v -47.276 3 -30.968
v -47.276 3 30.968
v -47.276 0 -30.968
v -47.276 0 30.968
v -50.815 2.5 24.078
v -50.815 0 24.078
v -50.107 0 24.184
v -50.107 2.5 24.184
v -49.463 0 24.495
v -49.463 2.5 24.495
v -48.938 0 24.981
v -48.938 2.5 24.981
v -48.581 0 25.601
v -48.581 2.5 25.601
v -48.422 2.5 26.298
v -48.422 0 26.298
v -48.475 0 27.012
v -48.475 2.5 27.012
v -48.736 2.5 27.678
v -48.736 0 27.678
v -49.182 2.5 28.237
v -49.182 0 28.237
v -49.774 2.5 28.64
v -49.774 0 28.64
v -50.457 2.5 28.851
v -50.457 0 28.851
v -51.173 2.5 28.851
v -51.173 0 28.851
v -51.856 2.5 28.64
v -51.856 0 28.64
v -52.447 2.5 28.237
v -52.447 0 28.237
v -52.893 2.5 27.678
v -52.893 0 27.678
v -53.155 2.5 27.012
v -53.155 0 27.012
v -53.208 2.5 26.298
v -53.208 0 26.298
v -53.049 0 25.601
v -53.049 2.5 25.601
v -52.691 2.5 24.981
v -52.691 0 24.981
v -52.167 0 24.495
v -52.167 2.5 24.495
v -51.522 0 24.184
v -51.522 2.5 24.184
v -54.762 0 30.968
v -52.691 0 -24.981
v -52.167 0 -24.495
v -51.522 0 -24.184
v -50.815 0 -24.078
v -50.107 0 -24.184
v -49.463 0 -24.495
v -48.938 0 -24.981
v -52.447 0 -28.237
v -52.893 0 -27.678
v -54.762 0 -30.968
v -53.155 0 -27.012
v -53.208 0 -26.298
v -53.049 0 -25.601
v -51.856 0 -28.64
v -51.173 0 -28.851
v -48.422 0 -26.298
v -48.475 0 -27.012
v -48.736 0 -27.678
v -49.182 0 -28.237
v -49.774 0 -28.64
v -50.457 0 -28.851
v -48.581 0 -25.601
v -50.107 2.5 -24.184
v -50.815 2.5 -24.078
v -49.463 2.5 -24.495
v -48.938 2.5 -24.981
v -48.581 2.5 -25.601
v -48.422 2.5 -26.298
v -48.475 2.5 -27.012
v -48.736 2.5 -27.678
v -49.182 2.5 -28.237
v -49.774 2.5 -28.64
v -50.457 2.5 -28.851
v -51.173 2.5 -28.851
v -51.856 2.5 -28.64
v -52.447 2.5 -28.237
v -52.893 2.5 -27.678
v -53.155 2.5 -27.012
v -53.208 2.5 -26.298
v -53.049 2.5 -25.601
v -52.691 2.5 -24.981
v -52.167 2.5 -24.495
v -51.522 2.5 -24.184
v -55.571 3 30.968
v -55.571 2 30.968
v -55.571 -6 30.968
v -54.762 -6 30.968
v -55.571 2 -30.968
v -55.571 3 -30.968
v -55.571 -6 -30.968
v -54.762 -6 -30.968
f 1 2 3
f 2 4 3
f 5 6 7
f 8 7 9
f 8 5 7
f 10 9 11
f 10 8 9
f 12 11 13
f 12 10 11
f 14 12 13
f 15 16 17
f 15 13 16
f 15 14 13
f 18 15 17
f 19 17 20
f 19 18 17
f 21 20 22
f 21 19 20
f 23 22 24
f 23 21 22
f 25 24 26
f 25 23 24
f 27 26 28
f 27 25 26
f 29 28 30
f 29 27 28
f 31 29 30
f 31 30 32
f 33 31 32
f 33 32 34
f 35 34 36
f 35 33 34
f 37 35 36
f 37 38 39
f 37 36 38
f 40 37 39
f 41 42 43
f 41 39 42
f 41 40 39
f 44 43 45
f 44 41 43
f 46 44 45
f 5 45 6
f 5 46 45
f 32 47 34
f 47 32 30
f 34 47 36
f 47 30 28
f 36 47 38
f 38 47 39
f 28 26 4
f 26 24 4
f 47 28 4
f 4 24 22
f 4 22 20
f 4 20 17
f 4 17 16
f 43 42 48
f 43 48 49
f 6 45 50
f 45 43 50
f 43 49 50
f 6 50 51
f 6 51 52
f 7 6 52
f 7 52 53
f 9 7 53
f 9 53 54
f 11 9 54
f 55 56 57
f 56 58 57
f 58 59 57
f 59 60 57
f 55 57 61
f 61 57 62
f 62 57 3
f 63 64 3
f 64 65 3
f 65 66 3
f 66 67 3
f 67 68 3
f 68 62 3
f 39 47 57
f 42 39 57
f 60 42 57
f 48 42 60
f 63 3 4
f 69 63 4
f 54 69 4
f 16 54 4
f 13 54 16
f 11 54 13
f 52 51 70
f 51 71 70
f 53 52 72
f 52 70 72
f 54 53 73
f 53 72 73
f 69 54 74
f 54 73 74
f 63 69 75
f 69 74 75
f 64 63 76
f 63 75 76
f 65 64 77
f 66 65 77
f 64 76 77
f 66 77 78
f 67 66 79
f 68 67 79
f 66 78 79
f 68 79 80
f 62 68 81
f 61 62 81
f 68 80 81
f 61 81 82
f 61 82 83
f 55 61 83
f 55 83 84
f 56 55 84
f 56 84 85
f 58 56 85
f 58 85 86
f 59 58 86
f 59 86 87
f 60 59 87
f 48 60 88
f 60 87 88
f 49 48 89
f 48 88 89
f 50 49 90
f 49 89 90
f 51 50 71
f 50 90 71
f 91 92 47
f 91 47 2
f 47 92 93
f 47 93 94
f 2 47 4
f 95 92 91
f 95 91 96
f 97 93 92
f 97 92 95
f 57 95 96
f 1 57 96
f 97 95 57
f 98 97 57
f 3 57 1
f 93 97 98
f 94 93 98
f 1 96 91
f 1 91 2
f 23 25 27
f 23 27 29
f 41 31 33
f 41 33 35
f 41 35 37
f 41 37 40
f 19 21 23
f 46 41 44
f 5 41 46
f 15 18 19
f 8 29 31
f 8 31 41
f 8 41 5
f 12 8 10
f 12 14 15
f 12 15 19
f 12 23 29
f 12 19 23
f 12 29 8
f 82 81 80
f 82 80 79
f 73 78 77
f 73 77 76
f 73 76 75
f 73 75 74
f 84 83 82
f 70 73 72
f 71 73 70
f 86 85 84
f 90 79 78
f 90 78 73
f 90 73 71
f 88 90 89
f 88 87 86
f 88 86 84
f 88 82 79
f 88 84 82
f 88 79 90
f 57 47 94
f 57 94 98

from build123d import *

# Parameters (mm, degrees)
SKETCH1_W               = 108.761980125
SKETCH1_H               = 61.936744186
BOSS_EXTRUDE1_DEPTH     = 2
SKETCH2_R               = 2.4
CUT_EXTRUDE1_DEPTH      = 63.943741049
MIRROR2_COPY_1_SKETCH_R = 2.4
MIRROR2_COPY_1_DEPTH    = 63.943741049
SKETCH3_W               = 94.024869854
SKETCH3_H               = 56.555498618
CUT_EXTRUDE2_DEPTH      = 63.943741049
SKETCH6_W               = 101.2762547
SKETCH6_H               = 61.936744186
CUT_EXTRUDE5_DEPTH      = 10
SKETCH8_W               = 0.808555921
SKETCH8_H               = 61.936744186
BOSS_EXTRUDE2_DEPTH     = 8
SKETCH10_W              = 8.294281346
SKETCH10_H              = 61.936744186
BOSS_EXTRUDE4_DEPTH     = 1
CUT_EXTRUDE6_START      = -0.5
SKETCH11_R              = 2.4
CUT_EXTRUDE6_DEPTH      = 0.5


with BuildPart() as part:
    # Sketch1 → Boss-Extrude1 (new body)
    with BuildSketch(Plane(origin=(0, 0, 0), x_dir=(1, 0, 0), z_dir=(0, 1, 0))):
        with Locations((-0.380990063, 0)):
            Rectangle(SKETCH1_W, SKETCH1_H)
    extrude(amount=BOSS_EXTRUDE1_DEPTH)

    # Sketch2 → Cut-Extrude1 (cut, symmetric)
    with BuildSketch(Plane(origin=(0, 2, 0), x_dir=(1, 0, 0), z_dir=(0, 1, 0))):
        with Locations(Location((-50.814865351, 26.477784527, 0), (0, 0, 270))):
            Circle(SKETCH2_R)
    cut_extrude1 = extrude(amount=CUT_EXTRUDE1_DEPTH, both=True, mode=Mode.SUBTRACT)

    # Mirror1: Cut-Extrude1 across plane
    add(cut_extrude1.mirror(Plane.XY), mode=Mode.SUBTRACT)

    # Mirror2: Cut-Extrude1 across plane
    add(cut_extrude1.mirror(Plane.ZY.offset(0.380990062)), mode=Mode.SUBTRACT)

    # Mirror2 copy 1 sketch → Mirror2 copy 1 (cut, symmetric)
    with BuildSketch(Plane(origin=(-0.761980125, 2, 0), x_dir=(-1, 0, 0), z_dir=(0, 1, 0))):
        with Locations(Location((-50.814865351, 26.477784527, 0), (0, 0, 270))):
            Circle(MIRROR2_COPY_1_SKETCH_R)
    extrude(amount=MIRROR2_COPY_1_DEPTH, both=True, mode=Mode.SUBTRACT)

    # Sketch3 → Cut-Extrude2 (cut, through all)
    with BuildSketch(Plane(origin=(0, 2, 0), x_dir=(1, 0, 0), z_dir=(0, 1, 0))):
        Rectangle(SKETCH3_W, SKETCH3_H)
    extrude(amount=-CUT_EXTRUDE2_DEPTH, mode=Mode.SUBTRACT)

    # Sketch6 → Cut-Extrude5 (cut)
    with BuildSketch(Plane(origin=(0, 2, 0), x_dir=(1, 0, 0), z_dir=(0, 1, 0))):
        with Locations((3.36187265, 0)):
            Rectangle(SKETCH6_W, SKETCH6_H)
    extrude(amount=-CUT_EXTRUDE5_DEPTH, mode=Mode.SUBTRACT)

    # Sketch8 → Boss-Extrude2 (add)
    with BuildSketch(Plane(origin=(0, 2, 0), x_dir=(1, 0, 0), z_dir=(0, 1, 0))):
        with Locations((-55.166258086, 0)):
            Rectangle(SKETCH8_W, SKETCH8_H)
    extrude(amount=-BOSS_EXTRUDE2_DEPTH)

    # Sketch10 → Boss-Extrude4 (add)
    with BuildSketch(Plane(origin=(0, 2, 0), x_dir=(1, 0, 0), z_dir=(0, 1, 0))):
        with Locations((-51.423395373, 0)):
            Rectangle(SKETCH10_W, SKETCH10_H)
    extrude(amount=BOSS_EXTRUDE4_DEPTH)

    # Sketch11 → Cut-Extrude6 (cut)
    with BuildSketch(Plane.XZ.offset(-2).offset(CUT_EXTRUDE6_START)):
        with Locations(Location((-50.814865351, -26.477784527, 0), (0, 0, 90))):
            Circle(SKETCH11_R)
        with Locations(Location((-50.814865351, 26.477784527, 0), (0, 0, 270))):
            Circle(SKETCH11_R)
    extrude(amount=CUT_EXTRUDE6_DEPTH, mode=Mode.SUBTRACT)


solid = part.part
